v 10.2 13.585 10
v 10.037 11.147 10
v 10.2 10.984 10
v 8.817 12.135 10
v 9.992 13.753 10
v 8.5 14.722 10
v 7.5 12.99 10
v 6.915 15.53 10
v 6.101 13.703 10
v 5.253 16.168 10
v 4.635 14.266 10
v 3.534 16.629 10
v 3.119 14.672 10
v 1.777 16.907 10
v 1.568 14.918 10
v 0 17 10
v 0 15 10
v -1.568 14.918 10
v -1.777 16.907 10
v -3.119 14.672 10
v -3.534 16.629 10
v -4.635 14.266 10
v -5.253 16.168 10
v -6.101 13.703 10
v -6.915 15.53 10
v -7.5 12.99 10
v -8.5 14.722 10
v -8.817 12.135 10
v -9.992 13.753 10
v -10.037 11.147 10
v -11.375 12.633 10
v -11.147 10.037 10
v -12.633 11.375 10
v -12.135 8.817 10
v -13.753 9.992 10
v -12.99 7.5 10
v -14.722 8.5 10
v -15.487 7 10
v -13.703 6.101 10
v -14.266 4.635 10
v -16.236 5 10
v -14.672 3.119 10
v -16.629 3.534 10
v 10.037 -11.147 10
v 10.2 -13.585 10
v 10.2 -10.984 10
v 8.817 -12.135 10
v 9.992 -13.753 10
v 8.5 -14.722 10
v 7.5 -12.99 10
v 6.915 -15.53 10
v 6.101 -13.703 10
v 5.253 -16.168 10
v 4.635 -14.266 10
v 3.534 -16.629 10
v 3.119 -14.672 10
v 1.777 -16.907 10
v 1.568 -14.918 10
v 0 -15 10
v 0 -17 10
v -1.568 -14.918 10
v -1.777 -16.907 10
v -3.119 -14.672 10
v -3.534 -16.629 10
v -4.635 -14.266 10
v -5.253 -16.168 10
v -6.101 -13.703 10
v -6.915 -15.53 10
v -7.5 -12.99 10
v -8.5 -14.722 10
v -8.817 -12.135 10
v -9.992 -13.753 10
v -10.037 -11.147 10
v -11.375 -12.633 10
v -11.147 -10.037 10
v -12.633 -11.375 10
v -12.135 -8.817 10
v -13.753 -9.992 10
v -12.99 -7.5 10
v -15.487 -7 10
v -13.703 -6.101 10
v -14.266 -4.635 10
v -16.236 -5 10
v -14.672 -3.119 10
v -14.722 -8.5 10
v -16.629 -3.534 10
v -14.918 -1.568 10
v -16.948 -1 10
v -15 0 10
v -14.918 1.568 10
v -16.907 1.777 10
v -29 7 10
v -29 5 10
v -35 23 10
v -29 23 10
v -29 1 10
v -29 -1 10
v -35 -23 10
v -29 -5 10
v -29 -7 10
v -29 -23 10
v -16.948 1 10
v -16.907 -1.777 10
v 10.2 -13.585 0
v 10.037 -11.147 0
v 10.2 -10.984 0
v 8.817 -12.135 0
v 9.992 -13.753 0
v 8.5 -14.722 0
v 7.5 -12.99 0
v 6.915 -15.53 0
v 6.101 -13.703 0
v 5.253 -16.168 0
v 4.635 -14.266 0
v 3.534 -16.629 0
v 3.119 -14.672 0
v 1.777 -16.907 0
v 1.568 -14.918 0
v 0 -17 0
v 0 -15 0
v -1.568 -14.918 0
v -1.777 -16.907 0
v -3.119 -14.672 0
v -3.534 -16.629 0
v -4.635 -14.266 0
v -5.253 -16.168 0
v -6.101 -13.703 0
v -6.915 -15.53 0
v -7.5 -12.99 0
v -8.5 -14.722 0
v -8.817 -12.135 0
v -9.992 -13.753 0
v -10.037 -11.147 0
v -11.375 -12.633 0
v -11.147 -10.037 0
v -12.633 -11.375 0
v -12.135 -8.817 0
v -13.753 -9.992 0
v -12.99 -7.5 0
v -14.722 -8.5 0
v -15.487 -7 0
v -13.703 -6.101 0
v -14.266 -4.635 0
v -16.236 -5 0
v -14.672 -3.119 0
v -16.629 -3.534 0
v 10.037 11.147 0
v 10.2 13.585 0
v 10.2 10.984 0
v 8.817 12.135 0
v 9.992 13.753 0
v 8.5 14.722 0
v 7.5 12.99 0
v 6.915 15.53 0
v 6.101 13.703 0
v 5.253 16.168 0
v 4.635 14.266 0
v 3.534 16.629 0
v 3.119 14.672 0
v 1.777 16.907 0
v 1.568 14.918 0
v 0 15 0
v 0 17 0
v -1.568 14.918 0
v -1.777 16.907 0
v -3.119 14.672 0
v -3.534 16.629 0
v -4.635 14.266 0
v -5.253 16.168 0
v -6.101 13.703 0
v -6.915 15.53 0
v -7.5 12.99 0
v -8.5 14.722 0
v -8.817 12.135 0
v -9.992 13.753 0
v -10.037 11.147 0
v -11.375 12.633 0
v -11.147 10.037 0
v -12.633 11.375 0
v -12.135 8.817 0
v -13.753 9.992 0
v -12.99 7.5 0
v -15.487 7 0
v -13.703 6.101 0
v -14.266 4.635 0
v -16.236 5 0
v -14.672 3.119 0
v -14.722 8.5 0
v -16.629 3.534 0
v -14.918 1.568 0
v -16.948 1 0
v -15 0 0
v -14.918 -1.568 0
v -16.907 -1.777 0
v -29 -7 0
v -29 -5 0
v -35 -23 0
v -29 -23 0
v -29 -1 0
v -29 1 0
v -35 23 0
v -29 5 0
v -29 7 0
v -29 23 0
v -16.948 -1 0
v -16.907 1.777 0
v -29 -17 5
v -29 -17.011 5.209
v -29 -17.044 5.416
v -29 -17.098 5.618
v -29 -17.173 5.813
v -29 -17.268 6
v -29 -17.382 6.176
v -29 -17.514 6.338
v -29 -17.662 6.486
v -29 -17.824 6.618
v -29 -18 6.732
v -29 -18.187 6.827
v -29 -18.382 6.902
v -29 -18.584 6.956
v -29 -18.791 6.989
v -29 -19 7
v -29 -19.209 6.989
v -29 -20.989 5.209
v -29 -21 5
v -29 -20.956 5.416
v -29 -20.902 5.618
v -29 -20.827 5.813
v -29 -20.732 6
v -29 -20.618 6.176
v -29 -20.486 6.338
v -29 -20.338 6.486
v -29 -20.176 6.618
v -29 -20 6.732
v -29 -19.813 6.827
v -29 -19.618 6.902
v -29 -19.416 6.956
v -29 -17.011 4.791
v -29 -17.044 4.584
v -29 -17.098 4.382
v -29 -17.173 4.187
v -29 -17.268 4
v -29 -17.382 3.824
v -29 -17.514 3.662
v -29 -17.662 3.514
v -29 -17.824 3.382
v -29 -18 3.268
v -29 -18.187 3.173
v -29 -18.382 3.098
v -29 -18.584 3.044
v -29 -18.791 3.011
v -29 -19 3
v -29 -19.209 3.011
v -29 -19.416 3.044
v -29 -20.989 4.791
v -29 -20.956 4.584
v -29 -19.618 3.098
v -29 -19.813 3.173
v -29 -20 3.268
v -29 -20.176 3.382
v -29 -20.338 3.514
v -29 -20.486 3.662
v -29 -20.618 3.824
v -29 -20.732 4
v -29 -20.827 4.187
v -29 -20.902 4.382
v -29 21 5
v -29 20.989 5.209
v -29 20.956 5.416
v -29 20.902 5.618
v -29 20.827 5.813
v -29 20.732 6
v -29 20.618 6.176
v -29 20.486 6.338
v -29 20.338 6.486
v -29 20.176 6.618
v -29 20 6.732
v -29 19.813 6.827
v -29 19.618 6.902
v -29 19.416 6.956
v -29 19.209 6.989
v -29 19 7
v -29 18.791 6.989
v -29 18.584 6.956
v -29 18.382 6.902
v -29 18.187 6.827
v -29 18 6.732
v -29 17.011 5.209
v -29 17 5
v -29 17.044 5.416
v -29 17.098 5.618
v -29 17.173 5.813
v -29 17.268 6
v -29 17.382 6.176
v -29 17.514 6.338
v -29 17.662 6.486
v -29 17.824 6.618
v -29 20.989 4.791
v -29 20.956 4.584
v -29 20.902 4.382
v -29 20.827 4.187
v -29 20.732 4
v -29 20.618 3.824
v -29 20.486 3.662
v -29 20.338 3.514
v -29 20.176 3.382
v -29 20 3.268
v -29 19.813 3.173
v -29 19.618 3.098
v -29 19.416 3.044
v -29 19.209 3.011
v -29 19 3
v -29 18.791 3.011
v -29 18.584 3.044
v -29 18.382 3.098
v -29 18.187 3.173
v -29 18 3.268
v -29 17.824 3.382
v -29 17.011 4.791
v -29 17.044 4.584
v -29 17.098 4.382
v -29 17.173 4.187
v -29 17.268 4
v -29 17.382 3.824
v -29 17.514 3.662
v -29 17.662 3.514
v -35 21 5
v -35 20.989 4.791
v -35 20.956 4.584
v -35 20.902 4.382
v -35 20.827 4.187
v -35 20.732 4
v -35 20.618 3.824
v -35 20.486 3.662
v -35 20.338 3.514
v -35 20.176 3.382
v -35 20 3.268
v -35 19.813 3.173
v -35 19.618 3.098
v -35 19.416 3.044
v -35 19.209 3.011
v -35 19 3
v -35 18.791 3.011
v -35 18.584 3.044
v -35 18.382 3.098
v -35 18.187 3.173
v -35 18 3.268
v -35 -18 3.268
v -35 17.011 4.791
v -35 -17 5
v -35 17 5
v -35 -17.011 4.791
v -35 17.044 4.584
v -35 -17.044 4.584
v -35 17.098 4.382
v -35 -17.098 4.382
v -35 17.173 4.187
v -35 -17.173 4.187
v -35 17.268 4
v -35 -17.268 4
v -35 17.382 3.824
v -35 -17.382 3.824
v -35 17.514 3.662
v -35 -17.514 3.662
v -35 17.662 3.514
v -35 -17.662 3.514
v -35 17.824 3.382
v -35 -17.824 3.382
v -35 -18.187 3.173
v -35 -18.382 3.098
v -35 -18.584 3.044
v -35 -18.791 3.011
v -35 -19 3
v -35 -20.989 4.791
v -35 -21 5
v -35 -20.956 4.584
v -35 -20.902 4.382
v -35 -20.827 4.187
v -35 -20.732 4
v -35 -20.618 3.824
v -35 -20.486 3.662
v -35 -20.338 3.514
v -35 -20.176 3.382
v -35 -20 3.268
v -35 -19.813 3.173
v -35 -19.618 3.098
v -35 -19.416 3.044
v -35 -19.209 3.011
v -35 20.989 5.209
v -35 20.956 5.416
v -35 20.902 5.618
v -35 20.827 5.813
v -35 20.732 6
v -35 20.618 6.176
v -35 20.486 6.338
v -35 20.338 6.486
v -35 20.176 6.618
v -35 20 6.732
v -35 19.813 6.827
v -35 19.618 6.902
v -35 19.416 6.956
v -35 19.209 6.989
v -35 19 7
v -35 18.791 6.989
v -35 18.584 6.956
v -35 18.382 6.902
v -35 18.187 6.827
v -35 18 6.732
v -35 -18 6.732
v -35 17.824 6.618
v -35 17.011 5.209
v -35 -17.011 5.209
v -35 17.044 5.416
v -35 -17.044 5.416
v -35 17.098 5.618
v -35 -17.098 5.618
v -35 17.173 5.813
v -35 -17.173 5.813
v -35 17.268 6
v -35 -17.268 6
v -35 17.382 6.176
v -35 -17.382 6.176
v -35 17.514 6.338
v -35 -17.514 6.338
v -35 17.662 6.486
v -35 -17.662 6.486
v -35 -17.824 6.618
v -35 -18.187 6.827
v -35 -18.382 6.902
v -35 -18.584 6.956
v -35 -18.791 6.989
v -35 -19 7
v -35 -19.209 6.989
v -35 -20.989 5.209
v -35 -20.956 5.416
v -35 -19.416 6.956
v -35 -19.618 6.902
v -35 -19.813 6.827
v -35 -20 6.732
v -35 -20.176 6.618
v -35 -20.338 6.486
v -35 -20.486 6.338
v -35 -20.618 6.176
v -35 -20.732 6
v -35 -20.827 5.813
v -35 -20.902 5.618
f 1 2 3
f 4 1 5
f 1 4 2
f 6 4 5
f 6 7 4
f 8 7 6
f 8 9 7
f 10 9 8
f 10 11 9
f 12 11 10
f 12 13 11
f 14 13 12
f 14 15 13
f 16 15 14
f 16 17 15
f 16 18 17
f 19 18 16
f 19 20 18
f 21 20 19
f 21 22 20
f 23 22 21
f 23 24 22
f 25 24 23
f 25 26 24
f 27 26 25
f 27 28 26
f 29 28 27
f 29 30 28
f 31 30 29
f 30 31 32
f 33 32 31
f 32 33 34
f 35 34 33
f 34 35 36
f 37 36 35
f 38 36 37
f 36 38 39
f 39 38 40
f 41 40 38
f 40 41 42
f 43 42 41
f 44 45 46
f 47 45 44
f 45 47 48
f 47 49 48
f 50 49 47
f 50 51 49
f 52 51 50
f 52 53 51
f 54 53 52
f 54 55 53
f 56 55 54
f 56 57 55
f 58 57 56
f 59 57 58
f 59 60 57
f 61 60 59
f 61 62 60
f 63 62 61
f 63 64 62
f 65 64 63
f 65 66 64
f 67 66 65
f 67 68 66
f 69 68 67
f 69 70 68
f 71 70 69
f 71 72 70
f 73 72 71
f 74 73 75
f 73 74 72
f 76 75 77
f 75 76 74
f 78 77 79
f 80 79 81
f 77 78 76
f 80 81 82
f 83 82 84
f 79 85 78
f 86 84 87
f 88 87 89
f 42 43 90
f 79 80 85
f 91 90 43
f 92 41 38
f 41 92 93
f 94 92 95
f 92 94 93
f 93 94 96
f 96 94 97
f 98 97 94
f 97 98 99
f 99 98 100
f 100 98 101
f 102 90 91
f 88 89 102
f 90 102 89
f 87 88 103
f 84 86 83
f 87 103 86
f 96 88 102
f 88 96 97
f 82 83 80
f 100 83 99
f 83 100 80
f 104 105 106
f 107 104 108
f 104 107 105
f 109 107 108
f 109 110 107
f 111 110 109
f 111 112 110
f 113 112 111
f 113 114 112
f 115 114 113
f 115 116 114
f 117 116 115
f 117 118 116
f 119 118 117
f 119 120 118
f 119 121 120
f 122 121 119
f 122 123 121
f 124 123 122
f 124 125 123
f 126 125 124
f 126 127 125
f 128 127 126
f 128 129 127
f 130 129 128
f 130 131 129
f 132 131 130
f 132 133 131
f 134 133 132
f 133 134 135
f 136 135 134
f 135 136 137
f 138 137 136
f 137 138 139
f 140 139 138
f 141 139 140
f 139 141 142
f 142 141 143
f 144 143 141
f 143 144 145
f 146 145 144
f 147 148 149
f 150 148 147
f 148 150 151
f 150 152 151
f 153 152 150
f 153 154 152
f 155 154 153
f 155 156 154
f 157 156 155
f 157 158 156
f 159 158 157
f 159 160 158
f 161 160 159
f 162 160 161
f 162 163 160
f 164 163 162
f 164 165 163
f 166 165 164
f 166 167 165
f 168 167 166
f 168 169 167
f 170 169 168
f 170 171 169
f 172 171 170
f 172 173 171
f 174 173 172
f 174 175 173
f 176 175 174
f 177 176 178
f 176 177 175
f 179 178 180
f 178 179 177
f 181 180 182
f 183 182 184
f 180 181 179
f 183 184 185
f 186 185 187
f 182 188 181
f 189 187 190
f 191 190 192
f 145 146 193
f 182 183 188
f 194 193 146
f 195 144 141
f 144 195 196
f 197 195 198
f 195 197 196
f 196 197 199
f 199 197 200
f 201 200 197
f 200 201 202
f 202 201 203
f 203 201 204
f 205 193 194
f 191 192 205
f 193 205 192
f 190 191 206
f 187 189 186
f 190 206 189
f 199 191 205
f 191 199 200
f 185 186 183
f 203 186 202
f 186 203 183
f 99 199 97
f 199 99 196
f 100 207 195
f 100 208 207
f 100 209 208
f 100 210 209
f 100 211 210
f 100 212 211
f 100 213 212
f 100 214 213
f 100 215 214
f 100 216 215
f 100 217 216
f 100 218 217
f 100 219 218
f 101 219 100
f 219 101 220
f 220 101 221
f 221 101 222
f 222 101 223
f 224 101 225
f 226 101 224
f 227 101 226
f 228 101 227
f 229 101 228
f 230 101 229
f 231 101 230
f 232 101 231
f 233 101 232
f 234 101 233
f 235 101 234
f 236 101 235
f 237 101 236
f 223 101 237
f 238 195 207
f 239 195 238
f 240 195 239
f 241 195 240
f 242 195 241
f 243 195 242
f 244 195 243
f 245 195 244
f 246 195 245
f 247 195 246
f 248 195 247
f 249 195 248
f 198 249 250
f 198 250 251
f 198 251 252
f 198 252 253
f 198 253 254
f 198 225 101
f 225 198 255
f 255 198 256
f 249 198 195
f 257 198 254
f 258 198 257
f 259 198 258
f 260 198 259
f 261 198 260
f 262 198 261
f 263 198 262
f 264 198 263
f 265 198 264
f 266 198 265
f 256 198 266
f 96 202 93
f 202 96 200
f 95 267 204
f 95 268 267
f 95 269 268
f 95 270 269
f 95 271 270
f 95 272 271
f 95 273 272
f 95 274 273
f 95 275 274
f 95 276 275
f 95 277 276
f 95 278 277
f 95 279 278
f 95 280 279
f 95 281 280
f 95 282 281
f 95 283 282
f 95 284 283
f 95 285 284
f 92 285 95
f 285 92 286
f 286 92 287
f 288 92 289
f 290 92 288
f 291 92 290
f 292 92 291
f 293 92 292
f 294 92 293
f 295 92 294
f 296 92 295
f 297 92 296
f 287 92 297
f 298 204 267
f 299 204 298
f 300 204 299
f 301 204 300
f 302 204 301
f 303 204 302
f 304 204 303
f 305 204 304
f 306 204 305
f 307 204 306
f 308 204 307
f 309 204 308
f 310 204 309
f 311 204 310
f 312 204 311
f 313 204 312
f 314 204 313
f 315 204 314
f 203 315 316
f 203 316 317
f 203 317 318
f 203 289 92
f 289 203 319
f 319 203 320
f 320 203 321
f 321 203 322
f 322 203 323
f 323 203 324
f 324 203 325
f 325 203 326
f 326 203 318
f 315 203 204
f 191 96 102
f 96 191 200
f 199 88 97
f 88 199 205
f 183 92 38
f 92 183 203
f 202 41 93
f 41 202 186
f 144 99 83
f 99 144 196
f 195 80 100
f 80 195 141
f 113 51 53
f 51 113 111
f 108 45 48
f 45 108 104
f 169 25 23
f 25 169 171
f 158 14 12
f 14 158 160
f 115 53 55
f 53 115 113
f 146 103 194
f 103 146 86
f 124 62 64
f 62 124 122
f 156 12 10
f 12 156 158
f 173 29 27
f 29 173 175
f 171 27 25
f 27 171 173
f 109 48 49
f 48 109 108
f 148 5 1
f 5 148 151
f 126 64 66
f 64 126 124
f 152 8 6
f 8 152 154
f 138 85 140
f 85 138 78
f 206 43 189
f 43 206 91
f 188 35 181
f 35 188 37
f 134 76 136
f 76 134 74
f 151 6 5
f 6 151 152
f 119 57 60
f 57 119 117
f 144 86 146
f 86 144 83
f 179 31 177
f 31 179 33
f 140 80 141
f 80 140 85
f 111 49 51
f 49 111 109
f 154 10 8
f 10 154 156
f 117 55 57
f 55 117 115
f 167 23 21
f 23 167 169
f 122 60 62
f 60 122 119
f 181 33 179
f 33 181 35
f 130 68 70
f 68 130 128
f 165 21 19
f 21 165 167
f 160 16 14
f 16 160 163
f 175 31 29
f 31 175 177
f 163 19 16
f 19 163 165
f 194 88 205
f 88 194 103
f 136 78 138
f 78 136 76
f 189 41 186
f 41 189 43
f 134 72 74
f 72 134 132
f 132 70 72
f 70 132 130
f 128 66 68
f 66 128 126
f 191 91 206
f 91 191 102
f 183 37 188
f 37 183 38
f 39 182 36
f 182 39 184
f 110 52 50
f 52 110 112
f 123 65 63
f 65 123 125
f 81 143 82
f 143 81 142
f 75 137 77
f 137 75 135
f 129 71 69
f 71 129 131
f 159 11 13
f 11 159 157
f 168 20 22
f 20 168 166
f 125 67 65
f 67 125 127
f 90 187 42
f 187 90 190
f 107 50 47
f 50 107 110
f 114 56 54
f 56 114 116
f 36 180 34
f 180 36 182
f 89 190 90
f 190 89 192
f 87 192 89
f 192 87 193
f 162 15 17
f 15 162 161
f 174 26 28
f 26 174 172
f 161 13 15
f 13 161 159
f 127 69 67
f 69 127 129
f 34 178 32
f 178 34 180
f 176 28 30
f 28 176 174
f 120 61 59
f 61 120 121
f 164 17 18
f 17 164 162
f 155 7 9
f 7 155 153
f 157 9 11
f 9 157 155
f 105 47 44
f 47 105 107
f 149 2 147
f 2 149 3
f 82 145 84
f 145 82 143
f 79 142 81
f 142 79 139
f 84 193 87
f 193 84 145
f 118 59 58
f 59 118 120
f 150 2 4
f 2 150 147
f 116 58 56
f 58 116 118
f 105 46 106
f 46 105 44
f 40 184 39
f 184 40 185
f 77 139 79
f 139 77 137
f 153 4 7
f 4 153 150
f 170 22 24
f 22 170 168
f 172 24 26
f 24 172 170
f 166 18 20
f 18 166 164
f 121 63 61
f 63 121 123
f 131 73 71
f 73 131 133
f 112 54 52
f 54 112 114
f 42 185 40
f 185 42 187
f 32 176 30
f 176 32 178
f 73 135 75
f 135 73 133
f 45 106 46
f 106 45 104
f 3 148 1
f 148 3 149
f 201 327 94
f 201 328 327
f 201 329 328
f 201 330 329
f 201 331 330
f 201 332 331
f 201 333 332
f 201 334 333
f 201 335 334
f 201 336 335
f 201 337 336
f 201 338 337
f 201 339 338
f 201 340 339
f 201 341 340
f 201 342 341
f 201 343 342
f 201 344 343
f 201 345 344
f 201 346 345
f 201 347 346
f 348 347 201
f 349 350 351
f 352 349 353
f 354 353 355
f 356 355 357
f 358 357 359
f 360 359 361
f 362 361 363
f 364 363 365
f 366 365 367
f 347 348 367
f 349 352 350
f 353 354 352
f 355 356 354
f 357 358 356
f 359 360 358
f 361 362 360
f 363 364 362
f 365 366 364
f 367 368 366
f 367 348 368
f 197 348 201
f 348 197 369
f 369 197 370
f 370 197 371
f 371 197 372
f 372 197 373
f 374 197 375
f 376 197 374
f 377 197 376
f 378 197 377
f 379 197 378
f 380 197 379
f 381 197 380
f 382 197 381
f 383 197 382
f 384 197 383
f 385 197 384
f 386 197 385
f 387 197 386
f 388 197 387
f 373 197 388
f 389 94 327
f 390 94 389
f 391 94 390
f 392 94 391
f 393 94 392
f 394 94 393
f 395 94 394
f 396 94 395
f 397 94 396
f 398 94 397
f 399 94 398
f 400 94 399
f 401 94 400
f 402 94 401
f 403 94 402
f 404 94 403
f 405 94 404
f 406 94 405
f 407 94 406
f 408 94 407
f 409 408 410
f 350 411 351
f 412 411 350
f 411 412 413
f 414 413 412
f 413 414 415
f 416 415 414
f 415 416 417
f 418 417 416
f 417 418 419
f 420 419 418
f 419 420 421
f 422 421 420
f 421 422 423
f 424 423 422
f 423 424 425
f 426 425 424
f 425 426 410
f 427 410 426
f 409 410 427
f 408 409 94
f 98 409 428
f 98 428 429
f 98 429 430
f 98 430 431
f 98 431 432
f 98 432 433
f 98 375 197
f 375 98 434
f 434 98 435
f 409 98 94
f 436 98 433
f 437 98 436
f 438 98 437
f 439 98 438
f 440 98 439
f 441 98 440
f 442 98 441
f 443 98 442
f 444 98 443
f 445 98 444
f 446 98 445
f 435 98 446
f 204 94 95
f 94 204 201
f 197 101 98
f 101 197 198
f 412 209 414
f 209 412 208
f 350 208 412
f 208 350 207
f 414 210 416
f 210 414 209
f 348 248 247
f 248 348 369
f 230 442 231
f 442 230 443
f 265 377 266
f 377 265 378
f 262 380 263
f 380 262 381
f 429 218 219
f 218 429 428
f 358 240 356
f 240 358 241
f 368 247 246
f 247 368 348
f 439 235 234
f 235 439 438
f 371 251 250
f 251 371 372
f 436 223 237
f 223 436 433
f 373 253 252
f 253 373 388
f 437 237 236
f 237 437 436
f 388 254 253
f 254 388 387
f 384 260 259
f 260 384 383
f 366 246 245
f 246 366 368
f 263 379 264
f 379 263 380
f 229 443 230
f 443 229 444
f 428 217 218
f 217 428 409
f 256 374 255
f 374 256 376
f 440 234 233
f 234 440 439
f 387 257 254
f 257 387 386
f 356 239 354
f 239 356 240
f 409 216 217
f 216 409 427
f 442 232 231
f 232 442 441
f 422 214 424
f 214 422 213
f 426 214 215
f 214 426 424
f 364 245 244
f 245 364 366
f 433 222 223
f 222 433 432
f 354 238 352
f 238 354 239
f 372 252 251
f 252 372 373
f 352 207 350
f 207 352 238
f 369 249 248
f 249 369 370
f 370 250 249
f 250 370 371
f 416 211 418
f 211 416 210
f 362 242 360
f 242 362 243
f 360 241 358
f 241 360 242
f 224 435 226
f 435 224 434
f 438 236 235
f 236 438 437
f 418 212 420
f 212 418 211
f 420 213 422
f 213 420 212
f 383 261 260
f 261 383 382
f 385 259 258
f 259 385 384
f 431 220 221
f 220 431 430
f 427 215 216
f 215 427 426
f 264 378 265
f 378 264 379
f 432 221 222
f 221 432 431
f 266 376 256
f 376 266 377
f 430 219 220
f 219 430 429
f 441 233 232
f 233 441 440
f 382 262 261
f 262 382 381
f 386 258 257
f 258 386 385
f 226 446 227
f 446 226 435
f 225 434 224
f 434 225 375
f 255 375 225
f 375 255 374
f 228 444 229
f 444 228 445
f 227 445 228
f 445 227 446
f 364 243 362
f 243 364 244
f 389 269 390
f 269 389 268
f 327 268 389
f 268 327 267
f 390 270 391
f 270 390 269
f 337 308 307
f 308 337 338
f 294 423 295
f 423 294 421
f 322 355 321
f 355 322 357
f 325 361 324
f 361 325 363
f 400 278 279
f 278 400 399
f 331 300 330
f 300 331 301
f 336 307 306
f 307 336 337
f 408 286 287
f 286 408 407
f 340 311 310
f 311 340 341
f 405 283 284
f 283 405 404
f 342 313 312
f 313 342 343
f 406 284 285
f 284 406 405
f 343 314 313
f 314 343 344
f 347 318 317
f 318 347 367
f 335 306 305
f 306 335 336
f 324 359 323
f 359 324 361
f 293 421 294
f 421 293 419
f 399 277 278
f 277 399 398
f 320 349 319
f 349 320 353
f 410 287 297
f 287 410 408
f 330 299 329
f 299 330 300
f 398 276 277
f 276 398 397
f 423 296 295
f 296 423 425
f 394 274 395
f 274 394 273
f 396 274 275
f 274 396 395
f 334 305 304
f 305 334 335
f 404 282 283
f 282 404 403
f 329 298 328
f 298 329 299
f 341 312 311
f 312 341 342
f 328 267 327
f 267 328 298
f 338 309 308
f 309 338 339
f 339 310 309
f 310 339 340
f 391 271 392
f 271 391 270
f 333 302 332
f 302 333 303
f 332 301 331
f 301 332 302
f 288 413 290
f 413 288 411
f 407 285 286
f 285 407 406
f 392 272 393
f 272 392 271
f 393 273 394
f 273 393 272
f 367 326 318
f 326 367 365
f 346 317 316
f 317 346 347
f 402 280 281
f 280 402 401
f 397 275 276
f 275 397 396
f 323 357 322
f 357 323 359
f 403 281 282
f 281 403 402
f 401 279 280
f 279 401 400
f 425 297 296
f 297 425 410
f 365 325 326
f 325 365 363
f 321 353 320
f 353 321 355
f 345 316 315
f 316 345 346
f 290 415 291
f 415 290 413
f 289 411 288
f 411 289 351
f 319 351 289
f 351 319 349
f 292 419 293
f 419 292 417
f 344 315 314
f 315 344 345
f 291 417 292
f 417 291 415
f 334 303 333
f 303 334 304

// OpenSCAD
/*kitchen plinth clip feb 2016 Glyn Cowles */
// diameter of pole
diam=30;
// clip height
ht=10; 
//percentage amount to cut off circle to form clip
cutpc=20;
// length to plinth from pole
len=20;
// thickness of clip
th=2; 
// diam of screw holes
holed=4; 
// base depth
based=6; 
holex=diam+th*2+holed; // distance apart of holes
basew=holex+holed*2; // screw part base width

$fn=60;
assemble();



//-------------------------------------------------
module assemble() {
    clip();     
    translate([-diam/2-len,-basew/2,0]) screwpart();     
}
 
//-------------------------------------------------
module clip() { 
    cut=(diam+2*th)*(cutpc/100);
    difference() {
        union() {
            rotate([0,0,0]) translate([-diam/2-len+based,-th/2,0]) strut();
            cylinder(r=diam/2+th,h=ht);
            }
        cylinder(r=diam/2,h=ht);
        translate([-cut+diam/2+th,-diam/2-th,0]) cube([diam,diam+th*2,ht]);
    }
}
//-------------------------------------------------
module strut() {
    cube([len,th,ht]);
    translate([0,th*3,0]) cube([len,th,ht]);
    translate([0,-th*3,0]) cube([len,th,ht]);
}
//-------------------------------------------------
module screwpart() {
    difference() {
        cube([based,basew,ht]);
        translate([0,-holex/2+basew/2,ht/2]) hol();
        translate([0,holex/2+basew/2,ht/2]) hol();
    }    
}
//-------------------------------------------------
module hol() {
    rotate([90,0,90]) cylinder(h=based,r=holed/2);   
}
//-------------------------------------------------
